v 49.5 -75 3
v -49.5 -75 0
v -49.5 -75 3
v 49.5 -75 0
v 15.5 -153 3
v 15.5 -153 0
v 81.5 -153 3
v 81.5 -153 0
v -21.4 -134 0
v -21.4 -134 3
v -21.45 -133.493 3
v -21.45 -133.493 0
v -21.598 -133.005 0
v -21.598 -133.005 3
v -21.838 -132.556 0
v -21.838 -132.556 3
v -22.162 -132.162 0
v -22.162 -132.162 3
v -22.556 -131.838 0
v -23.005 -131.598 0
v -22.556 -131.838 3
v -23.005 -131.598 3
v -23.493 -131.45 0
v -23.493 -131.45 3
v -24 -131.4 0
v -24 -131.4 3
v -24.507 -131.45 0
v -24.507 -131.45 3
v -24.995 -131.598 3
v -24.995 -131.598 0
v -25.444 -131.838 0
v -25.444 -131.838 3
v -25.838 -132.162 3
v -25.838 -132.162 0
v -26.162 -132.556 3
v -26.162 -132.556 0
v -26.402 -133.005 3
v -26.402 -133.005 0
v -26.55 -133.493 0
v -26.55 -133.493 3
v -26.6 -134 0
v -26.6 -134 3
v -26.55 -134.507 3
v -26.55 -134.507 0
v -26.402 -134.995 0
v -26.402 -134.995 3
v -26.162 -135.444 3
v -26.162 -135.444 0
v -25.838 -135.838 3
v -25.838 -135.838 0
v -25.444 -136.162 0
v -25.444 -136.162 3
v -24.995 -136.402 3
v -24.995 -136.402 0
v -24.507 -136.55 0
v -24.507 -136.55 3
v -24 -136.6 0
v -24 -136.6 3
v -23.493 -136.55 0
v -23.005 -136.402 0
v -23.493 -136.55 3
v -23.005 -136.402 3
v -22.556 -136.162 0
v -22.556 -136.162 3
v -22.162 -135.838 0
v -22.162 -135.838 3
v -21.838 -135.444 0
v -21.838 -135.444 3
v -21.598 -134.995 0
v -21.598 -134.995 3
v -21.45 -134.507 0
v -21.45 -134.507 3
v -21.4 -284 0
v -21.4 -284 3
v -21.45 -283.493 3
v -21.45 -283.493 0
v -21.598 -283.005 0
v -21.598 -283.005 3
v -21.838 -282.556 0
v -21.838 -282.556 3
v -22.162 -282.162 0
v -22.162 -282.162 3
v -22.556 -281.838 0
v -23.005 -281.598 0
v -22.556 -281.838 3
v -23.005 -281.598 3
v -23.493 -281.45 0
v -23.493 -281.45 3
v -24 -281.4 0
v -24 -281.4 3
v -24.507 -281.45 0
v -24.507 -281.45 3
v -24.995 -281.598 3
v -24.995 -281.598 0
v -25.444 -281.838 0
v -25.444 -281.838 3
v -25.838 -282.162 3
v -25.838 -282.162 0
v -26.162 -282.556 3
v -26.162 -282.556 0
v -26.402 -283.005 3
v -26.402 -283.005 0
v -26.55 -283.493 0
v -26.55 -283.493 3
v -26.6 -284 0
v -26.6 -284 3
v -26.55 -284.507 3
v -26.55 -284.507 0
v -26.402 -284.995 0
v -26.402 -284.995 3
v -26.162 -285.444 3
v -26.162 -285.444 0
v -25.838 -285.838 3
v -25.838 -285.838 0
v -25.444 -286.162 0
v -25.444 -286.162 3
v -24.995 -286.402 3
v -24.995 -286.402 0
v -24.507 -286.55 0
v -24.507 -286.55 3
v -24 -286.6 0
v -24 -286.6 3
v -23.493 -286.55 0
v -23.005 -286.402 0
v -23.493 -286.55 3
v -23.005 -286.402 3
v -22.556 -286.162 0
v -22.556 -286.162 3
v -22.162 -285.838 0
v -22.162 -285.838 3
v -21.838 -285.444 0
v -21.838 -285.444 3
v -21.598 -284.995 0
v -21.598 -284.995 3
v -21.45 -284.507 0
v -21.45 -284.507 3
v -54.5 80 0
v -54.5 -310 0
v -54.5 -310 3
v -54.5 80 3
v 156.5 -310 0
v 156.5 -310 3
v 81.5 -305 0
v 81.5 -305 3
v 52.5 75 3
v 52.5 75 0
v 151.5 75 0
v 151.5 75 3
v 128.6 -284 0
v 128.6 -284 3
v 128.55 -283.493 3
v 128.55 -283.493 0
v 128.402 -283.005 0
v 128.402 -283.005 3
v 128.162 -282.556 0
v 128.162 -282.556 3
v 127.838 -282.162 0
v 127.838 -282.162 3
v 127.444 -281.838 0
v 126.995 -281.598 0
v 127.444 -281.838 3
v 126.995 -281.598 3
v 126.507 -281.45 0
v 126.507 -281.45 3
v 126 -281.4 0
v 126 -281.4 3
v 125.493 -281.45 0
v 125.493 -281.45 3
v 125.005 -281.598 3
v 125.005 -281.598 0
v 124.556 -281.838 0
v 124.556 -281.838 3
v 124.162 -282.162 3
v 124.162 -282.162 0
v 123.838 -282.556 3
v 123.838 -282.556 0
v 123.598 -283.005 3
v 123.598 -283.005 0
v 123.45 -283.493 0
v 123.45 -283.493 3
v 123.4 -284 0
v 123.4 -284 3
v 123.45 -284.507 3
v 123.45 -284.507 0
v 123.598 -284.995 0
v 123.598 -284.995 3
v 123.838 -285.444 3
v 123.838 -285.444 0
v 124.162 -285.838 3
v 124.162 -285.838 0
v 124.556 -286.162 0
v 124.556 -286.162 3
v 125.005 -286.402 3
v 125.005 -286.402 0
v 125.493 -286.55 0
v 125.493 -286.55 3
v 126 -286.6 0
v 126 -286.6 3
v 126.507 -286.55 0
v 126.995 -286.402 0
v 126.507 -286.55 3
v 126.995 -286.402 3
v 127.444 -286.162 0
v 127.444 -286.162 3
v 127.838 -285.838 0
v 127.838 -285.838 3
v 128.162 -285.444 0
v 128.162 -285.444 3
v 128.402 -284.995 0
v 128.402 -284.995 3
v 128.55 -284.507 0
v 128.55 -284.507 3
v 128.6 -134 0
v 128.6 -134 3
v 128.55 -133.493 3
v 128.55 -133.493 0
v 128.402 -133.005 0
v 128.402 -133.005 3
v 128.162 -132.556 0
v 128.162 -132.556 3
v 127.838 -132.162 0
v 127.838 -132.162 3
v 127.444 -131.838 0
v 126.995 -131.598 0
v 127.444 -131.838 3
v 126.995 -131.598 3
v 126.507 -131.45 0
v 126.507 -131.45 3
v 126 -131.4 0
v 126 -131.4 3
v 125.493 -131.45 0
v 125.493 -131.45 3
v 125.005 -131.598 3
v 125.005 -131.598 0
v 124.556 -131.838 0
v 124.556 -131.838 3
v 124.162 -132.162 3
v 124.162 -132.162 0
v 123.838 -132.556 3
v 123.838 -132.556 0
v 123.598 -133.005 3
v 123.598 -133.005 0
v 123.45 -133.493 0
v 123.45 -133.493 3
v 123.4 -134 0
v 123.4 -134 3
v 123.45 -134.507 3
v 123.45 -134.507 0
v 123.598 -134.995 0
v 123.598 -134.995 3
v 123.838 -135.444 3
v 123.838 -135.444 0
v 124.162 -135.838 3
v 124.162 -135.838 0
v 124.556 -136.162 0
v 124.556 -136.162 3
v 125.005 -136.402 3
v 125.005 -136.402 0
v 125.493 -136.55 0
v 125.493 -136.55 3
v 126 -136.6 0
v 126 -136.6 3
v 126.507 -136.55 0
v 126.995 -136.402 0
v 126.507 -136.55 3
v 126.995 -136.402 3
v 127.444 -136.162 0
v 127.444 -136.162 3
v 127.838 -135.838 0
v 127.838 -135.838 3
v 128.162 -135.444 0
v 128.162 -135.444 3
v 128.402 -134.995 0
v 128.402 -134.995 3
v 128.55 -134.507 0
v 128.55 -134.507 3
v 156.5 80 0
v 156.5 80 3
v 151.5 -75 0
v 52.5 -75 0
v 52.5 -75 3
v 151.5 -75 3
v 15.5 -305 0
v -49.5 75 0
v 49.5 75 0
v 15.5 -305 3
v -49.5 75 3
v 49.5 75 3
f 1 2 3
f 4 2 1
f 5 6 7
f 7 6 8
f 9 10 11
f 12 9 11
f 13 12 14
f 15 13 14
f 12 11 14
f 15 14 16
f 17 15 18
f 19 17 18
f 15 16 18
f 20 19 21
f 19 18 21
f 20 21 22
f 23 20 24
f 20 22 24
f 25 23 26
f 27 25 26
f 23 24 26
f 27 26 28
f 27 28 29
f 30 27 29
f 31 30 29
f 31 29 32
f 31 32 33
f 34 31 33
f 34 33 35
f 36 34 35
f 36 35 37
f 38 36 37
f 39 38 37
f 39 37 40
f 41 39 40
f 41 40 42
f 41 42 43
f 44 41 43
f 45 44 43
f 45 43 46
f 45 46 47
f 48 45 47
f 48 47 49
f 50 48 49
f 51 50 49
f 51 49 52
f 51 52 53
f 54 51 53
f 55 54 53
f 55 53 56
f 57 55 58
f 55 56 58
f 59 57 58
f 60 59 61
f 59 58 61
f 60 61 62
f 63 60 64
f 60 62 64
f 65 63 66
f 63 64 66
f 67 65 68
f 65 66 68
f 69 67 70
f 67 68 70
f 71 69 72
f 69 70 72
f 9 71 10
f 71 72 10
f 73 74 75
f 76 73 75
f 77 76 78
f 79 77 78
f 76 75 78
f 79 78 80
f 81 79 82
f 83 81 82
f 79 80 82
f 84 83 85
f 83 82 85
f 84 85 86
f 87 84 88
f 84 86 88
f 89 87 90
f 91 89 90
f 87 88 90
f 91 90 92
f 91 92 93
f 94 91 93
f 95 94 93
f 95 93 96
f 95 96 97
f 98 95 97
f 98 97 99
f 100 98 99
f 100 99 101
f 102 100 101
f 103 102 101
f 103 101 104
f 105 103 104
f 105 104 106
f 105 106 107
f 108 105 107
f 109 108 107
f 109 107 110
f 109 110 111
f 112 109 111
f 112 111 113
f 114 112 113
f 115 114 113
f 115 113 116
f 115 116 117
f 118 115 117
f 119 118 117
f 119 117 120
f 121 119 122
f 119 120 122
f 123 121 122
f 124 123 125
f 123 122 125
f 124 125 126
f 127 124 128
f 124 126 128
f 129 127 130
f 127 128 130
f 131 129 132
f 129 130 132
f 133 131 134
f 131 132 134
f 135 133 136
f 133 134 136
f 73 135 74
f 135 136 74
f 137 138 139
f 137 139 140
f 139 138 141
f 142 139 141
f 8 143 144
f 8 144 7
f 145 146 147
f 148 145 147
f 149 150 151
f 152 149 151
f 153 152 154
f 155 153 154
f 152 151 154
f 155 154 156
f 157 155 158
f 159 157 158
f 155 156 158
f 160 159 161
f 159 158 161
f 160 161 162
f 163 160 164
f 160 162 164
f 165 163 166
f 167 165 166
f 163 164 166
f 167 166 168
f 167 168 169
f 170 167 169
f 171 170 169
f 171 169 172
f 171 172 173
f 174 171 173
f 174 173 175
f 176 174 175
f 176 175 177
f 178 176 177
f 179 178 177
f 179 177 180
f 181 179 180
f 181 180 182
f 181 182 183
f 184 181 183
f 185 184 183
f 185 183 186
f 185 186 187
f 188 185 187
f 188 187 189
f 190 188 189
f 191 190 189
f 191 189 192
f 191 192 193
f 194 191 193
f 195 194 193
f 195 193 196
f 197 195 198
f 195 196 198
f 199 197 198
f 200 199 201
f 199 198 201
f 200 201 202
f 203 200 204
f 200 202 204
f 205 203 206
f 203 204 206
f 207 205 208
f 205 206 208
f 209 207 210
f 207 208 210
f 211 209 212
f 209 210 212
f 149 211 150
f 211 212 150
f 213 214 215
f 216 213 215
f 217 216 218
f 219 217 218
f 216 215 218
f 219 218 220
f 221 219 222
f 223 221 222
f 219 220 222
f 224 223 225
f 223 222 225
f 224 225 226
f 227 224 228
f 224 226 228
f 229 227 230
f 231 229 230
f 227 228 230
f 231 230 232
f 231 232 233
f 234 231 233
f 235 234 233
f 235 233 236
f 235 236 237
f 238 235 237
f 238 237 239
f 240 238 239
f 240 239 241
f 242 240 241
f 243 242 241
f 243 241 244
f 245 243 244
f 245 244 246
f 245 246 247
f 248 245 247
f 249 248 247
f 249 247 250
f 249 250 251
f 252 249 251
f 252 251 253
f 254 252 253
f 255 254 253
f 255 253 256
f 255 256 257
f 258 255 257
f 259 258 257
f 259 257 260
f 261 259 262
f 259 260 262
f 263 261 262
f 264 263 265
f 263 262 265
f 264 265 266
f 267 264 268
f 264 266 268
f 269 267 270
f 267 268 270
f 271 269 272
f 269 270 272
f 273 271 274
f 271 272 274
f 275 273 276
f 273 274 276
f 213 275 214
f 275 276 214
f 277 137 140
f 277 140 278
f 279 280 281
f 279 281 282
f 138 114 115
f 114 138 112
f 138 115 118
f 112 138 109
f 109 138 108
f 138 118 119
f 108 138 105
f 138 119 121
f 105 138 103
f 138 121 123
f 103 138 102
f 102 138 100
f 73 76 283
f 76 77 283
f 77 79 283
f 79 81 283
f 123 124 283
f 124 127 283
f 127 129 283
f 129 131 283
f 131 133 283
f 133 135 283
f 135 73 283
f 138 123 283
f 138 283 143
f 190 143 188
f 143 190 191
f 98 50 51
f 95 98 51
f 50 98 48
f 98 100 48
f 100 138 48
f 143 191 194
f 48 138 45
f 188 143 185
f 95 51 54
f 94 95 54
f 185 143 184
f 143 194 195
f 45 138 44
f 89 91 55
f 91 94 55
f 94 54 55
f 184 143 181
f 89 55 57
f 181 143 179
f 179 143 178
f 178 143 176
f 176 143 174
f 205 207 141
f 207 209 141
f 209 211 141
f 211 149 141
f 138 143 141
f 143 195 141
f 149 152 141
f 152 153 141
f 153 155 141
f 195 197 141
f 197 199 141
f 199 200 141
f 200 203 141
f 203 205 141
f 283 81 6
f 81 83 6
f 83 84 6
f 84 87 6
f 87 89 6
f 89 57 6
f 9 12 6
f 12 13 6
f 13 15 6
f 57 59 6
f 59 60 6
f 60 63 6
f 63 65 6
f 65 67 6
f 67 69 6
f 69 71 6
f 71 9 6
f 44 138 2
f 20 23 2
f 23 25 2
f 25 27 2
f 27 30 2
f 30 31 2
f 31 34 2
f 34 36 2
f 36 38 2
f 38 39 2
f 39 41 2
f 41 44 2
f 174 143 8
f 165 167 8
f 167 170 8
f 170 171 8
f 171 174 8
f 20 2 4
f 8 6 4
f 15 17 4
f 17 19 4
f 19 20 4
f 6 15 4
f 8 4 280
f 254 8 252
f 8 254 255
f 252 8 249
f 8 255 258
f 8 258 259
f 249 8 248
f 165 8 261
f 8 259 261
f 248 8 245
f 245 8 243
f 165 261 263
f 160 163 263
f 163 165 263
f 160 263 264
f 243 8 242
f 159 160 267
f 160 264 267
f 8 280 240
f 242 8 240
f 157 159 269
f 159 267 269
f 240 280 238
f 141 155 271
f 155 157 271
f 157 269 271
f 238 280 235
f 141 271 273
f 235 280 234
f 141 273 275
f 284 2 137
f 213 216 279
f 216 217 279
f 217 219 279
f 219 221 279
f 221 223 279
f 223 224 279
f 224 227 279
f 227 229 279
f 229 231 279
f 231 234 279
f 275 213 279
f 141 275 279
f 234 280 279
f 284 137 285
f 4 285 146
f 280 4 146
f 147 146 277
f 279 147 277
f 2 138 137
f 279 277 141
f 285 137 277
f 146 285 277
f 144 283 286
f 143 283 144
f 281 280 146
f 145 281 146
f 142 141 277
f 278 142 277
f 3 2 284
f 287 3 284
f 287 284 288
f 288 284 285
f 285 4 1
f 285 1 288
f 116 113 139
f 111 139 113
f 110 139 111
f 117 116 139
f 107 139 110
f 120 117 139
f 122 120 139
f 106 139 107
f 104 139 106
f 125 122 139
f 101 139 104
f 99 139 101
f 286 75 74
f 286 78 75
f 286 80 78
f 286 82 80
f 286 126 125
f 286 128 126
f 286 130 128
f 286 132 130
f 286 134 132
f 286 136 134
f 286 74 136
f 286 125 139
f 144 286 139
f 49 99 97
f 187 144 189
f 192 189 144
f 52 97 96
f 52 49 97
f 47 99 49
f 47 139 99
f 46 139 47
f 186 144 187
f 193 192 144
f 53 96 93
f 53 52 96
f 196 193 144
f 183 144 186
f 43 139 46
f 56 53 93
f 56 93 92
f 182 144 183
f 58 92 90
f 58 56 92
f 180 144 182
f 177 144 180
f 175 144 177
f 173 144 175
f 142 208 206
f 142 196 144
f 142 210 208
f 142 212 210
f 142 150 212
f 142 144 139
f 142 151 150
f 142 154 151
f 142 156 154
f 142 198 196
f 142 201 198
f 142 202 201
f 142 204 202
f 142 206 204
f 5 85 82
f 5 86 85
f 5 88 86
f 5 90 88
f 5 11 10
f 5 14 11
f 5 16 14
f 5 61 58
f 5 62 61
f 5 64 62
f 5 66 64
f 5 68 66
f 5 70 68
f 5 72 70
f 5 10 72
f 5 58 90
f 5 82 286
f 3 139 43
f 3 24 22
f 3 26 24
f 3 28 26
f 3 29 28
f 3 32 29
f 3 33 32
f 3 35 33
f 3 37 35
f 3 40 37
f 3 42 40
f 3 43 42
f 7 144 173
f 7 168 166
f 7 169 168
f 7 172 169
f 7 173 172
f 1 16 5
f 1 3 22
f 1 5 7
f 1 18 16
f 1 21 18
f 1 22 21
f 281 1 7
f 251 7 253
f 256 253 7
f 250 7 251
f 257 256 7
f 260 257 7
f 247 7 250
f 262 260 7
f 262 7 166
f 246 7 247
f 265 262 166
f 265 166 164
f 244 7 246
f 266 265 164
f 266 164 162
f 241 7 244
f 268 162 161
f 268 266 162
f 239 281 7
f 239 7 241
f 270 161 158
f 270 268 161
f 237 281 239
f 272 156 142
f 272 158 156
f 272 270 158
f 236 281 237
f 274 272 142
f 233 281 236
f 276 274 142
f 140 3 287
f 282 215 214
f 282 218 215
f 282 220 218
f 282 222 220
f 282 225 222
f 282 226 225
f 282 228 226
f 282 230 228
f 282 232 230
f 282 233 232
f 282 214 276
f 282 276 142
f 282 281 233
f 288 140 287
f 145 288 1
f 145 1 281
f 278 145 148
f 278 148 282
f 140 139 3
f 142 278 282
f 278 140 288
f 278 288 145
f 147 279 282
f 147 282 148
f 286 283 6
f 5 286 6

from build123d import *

# Parameters (mm, degrees)
SKETCH1_W           = 211
SKETCH1_H           = 390
SKETCH1_W_2         = 99
SKETCH1_H_2         = 150
SKETCH1_W_3         = 66
SKETCH1_H_3         = 152
BOSS_EXTRUDE1_DEPTH = 3
SKETCH2_R           = 2.6
CUT_EXTRUDE1_DEPTH  = 348.276906805


with BuildPart() as part:
    # Sketch1 → Boss-Extrude1 (new body)
    with BuildSketch(Plane.XY):
        with Locations((51, -115)):
            Rectangle(SKETCH1_W, SKETCH1_H)
        Rectangle(SKETCH1_W_2, SKETCH1_H_2, mode=Mode.SUBTRACT)
        with Locations((102, 0)):
            Rectangle(SKETCH1_W_2, SKETCH1_H_2, mode=Mode.SUBTRACT)
        with Locations((48.5, -229)):
            Rectangle(SKETCH1_W_3, SKETCH1_H_3, mode=Mode.SUBTRACT)
    extrude(amount=BOSS_EXTRUDE1_DEPTH)

    # Sketch2 → Cut-Extrude1 (cut, through all)
    with BuildSketch(Plane.XY.offset(3)):
        with Locations((-24, -134)):
            Circle(SKETCH2_R)
        with Locations((126, -134)):
            Circle(SKETCH2_R)
        with Locations((126, -284)):
            Circle(SKETCH2_R)
        with Locations((-24, -284)):
            Circle(SKETCH2_R)
    extrude(amount=-CUT_EXTRUDE1_DEPTH, mode=Mode.SUBTRACT)


solid = part.part
